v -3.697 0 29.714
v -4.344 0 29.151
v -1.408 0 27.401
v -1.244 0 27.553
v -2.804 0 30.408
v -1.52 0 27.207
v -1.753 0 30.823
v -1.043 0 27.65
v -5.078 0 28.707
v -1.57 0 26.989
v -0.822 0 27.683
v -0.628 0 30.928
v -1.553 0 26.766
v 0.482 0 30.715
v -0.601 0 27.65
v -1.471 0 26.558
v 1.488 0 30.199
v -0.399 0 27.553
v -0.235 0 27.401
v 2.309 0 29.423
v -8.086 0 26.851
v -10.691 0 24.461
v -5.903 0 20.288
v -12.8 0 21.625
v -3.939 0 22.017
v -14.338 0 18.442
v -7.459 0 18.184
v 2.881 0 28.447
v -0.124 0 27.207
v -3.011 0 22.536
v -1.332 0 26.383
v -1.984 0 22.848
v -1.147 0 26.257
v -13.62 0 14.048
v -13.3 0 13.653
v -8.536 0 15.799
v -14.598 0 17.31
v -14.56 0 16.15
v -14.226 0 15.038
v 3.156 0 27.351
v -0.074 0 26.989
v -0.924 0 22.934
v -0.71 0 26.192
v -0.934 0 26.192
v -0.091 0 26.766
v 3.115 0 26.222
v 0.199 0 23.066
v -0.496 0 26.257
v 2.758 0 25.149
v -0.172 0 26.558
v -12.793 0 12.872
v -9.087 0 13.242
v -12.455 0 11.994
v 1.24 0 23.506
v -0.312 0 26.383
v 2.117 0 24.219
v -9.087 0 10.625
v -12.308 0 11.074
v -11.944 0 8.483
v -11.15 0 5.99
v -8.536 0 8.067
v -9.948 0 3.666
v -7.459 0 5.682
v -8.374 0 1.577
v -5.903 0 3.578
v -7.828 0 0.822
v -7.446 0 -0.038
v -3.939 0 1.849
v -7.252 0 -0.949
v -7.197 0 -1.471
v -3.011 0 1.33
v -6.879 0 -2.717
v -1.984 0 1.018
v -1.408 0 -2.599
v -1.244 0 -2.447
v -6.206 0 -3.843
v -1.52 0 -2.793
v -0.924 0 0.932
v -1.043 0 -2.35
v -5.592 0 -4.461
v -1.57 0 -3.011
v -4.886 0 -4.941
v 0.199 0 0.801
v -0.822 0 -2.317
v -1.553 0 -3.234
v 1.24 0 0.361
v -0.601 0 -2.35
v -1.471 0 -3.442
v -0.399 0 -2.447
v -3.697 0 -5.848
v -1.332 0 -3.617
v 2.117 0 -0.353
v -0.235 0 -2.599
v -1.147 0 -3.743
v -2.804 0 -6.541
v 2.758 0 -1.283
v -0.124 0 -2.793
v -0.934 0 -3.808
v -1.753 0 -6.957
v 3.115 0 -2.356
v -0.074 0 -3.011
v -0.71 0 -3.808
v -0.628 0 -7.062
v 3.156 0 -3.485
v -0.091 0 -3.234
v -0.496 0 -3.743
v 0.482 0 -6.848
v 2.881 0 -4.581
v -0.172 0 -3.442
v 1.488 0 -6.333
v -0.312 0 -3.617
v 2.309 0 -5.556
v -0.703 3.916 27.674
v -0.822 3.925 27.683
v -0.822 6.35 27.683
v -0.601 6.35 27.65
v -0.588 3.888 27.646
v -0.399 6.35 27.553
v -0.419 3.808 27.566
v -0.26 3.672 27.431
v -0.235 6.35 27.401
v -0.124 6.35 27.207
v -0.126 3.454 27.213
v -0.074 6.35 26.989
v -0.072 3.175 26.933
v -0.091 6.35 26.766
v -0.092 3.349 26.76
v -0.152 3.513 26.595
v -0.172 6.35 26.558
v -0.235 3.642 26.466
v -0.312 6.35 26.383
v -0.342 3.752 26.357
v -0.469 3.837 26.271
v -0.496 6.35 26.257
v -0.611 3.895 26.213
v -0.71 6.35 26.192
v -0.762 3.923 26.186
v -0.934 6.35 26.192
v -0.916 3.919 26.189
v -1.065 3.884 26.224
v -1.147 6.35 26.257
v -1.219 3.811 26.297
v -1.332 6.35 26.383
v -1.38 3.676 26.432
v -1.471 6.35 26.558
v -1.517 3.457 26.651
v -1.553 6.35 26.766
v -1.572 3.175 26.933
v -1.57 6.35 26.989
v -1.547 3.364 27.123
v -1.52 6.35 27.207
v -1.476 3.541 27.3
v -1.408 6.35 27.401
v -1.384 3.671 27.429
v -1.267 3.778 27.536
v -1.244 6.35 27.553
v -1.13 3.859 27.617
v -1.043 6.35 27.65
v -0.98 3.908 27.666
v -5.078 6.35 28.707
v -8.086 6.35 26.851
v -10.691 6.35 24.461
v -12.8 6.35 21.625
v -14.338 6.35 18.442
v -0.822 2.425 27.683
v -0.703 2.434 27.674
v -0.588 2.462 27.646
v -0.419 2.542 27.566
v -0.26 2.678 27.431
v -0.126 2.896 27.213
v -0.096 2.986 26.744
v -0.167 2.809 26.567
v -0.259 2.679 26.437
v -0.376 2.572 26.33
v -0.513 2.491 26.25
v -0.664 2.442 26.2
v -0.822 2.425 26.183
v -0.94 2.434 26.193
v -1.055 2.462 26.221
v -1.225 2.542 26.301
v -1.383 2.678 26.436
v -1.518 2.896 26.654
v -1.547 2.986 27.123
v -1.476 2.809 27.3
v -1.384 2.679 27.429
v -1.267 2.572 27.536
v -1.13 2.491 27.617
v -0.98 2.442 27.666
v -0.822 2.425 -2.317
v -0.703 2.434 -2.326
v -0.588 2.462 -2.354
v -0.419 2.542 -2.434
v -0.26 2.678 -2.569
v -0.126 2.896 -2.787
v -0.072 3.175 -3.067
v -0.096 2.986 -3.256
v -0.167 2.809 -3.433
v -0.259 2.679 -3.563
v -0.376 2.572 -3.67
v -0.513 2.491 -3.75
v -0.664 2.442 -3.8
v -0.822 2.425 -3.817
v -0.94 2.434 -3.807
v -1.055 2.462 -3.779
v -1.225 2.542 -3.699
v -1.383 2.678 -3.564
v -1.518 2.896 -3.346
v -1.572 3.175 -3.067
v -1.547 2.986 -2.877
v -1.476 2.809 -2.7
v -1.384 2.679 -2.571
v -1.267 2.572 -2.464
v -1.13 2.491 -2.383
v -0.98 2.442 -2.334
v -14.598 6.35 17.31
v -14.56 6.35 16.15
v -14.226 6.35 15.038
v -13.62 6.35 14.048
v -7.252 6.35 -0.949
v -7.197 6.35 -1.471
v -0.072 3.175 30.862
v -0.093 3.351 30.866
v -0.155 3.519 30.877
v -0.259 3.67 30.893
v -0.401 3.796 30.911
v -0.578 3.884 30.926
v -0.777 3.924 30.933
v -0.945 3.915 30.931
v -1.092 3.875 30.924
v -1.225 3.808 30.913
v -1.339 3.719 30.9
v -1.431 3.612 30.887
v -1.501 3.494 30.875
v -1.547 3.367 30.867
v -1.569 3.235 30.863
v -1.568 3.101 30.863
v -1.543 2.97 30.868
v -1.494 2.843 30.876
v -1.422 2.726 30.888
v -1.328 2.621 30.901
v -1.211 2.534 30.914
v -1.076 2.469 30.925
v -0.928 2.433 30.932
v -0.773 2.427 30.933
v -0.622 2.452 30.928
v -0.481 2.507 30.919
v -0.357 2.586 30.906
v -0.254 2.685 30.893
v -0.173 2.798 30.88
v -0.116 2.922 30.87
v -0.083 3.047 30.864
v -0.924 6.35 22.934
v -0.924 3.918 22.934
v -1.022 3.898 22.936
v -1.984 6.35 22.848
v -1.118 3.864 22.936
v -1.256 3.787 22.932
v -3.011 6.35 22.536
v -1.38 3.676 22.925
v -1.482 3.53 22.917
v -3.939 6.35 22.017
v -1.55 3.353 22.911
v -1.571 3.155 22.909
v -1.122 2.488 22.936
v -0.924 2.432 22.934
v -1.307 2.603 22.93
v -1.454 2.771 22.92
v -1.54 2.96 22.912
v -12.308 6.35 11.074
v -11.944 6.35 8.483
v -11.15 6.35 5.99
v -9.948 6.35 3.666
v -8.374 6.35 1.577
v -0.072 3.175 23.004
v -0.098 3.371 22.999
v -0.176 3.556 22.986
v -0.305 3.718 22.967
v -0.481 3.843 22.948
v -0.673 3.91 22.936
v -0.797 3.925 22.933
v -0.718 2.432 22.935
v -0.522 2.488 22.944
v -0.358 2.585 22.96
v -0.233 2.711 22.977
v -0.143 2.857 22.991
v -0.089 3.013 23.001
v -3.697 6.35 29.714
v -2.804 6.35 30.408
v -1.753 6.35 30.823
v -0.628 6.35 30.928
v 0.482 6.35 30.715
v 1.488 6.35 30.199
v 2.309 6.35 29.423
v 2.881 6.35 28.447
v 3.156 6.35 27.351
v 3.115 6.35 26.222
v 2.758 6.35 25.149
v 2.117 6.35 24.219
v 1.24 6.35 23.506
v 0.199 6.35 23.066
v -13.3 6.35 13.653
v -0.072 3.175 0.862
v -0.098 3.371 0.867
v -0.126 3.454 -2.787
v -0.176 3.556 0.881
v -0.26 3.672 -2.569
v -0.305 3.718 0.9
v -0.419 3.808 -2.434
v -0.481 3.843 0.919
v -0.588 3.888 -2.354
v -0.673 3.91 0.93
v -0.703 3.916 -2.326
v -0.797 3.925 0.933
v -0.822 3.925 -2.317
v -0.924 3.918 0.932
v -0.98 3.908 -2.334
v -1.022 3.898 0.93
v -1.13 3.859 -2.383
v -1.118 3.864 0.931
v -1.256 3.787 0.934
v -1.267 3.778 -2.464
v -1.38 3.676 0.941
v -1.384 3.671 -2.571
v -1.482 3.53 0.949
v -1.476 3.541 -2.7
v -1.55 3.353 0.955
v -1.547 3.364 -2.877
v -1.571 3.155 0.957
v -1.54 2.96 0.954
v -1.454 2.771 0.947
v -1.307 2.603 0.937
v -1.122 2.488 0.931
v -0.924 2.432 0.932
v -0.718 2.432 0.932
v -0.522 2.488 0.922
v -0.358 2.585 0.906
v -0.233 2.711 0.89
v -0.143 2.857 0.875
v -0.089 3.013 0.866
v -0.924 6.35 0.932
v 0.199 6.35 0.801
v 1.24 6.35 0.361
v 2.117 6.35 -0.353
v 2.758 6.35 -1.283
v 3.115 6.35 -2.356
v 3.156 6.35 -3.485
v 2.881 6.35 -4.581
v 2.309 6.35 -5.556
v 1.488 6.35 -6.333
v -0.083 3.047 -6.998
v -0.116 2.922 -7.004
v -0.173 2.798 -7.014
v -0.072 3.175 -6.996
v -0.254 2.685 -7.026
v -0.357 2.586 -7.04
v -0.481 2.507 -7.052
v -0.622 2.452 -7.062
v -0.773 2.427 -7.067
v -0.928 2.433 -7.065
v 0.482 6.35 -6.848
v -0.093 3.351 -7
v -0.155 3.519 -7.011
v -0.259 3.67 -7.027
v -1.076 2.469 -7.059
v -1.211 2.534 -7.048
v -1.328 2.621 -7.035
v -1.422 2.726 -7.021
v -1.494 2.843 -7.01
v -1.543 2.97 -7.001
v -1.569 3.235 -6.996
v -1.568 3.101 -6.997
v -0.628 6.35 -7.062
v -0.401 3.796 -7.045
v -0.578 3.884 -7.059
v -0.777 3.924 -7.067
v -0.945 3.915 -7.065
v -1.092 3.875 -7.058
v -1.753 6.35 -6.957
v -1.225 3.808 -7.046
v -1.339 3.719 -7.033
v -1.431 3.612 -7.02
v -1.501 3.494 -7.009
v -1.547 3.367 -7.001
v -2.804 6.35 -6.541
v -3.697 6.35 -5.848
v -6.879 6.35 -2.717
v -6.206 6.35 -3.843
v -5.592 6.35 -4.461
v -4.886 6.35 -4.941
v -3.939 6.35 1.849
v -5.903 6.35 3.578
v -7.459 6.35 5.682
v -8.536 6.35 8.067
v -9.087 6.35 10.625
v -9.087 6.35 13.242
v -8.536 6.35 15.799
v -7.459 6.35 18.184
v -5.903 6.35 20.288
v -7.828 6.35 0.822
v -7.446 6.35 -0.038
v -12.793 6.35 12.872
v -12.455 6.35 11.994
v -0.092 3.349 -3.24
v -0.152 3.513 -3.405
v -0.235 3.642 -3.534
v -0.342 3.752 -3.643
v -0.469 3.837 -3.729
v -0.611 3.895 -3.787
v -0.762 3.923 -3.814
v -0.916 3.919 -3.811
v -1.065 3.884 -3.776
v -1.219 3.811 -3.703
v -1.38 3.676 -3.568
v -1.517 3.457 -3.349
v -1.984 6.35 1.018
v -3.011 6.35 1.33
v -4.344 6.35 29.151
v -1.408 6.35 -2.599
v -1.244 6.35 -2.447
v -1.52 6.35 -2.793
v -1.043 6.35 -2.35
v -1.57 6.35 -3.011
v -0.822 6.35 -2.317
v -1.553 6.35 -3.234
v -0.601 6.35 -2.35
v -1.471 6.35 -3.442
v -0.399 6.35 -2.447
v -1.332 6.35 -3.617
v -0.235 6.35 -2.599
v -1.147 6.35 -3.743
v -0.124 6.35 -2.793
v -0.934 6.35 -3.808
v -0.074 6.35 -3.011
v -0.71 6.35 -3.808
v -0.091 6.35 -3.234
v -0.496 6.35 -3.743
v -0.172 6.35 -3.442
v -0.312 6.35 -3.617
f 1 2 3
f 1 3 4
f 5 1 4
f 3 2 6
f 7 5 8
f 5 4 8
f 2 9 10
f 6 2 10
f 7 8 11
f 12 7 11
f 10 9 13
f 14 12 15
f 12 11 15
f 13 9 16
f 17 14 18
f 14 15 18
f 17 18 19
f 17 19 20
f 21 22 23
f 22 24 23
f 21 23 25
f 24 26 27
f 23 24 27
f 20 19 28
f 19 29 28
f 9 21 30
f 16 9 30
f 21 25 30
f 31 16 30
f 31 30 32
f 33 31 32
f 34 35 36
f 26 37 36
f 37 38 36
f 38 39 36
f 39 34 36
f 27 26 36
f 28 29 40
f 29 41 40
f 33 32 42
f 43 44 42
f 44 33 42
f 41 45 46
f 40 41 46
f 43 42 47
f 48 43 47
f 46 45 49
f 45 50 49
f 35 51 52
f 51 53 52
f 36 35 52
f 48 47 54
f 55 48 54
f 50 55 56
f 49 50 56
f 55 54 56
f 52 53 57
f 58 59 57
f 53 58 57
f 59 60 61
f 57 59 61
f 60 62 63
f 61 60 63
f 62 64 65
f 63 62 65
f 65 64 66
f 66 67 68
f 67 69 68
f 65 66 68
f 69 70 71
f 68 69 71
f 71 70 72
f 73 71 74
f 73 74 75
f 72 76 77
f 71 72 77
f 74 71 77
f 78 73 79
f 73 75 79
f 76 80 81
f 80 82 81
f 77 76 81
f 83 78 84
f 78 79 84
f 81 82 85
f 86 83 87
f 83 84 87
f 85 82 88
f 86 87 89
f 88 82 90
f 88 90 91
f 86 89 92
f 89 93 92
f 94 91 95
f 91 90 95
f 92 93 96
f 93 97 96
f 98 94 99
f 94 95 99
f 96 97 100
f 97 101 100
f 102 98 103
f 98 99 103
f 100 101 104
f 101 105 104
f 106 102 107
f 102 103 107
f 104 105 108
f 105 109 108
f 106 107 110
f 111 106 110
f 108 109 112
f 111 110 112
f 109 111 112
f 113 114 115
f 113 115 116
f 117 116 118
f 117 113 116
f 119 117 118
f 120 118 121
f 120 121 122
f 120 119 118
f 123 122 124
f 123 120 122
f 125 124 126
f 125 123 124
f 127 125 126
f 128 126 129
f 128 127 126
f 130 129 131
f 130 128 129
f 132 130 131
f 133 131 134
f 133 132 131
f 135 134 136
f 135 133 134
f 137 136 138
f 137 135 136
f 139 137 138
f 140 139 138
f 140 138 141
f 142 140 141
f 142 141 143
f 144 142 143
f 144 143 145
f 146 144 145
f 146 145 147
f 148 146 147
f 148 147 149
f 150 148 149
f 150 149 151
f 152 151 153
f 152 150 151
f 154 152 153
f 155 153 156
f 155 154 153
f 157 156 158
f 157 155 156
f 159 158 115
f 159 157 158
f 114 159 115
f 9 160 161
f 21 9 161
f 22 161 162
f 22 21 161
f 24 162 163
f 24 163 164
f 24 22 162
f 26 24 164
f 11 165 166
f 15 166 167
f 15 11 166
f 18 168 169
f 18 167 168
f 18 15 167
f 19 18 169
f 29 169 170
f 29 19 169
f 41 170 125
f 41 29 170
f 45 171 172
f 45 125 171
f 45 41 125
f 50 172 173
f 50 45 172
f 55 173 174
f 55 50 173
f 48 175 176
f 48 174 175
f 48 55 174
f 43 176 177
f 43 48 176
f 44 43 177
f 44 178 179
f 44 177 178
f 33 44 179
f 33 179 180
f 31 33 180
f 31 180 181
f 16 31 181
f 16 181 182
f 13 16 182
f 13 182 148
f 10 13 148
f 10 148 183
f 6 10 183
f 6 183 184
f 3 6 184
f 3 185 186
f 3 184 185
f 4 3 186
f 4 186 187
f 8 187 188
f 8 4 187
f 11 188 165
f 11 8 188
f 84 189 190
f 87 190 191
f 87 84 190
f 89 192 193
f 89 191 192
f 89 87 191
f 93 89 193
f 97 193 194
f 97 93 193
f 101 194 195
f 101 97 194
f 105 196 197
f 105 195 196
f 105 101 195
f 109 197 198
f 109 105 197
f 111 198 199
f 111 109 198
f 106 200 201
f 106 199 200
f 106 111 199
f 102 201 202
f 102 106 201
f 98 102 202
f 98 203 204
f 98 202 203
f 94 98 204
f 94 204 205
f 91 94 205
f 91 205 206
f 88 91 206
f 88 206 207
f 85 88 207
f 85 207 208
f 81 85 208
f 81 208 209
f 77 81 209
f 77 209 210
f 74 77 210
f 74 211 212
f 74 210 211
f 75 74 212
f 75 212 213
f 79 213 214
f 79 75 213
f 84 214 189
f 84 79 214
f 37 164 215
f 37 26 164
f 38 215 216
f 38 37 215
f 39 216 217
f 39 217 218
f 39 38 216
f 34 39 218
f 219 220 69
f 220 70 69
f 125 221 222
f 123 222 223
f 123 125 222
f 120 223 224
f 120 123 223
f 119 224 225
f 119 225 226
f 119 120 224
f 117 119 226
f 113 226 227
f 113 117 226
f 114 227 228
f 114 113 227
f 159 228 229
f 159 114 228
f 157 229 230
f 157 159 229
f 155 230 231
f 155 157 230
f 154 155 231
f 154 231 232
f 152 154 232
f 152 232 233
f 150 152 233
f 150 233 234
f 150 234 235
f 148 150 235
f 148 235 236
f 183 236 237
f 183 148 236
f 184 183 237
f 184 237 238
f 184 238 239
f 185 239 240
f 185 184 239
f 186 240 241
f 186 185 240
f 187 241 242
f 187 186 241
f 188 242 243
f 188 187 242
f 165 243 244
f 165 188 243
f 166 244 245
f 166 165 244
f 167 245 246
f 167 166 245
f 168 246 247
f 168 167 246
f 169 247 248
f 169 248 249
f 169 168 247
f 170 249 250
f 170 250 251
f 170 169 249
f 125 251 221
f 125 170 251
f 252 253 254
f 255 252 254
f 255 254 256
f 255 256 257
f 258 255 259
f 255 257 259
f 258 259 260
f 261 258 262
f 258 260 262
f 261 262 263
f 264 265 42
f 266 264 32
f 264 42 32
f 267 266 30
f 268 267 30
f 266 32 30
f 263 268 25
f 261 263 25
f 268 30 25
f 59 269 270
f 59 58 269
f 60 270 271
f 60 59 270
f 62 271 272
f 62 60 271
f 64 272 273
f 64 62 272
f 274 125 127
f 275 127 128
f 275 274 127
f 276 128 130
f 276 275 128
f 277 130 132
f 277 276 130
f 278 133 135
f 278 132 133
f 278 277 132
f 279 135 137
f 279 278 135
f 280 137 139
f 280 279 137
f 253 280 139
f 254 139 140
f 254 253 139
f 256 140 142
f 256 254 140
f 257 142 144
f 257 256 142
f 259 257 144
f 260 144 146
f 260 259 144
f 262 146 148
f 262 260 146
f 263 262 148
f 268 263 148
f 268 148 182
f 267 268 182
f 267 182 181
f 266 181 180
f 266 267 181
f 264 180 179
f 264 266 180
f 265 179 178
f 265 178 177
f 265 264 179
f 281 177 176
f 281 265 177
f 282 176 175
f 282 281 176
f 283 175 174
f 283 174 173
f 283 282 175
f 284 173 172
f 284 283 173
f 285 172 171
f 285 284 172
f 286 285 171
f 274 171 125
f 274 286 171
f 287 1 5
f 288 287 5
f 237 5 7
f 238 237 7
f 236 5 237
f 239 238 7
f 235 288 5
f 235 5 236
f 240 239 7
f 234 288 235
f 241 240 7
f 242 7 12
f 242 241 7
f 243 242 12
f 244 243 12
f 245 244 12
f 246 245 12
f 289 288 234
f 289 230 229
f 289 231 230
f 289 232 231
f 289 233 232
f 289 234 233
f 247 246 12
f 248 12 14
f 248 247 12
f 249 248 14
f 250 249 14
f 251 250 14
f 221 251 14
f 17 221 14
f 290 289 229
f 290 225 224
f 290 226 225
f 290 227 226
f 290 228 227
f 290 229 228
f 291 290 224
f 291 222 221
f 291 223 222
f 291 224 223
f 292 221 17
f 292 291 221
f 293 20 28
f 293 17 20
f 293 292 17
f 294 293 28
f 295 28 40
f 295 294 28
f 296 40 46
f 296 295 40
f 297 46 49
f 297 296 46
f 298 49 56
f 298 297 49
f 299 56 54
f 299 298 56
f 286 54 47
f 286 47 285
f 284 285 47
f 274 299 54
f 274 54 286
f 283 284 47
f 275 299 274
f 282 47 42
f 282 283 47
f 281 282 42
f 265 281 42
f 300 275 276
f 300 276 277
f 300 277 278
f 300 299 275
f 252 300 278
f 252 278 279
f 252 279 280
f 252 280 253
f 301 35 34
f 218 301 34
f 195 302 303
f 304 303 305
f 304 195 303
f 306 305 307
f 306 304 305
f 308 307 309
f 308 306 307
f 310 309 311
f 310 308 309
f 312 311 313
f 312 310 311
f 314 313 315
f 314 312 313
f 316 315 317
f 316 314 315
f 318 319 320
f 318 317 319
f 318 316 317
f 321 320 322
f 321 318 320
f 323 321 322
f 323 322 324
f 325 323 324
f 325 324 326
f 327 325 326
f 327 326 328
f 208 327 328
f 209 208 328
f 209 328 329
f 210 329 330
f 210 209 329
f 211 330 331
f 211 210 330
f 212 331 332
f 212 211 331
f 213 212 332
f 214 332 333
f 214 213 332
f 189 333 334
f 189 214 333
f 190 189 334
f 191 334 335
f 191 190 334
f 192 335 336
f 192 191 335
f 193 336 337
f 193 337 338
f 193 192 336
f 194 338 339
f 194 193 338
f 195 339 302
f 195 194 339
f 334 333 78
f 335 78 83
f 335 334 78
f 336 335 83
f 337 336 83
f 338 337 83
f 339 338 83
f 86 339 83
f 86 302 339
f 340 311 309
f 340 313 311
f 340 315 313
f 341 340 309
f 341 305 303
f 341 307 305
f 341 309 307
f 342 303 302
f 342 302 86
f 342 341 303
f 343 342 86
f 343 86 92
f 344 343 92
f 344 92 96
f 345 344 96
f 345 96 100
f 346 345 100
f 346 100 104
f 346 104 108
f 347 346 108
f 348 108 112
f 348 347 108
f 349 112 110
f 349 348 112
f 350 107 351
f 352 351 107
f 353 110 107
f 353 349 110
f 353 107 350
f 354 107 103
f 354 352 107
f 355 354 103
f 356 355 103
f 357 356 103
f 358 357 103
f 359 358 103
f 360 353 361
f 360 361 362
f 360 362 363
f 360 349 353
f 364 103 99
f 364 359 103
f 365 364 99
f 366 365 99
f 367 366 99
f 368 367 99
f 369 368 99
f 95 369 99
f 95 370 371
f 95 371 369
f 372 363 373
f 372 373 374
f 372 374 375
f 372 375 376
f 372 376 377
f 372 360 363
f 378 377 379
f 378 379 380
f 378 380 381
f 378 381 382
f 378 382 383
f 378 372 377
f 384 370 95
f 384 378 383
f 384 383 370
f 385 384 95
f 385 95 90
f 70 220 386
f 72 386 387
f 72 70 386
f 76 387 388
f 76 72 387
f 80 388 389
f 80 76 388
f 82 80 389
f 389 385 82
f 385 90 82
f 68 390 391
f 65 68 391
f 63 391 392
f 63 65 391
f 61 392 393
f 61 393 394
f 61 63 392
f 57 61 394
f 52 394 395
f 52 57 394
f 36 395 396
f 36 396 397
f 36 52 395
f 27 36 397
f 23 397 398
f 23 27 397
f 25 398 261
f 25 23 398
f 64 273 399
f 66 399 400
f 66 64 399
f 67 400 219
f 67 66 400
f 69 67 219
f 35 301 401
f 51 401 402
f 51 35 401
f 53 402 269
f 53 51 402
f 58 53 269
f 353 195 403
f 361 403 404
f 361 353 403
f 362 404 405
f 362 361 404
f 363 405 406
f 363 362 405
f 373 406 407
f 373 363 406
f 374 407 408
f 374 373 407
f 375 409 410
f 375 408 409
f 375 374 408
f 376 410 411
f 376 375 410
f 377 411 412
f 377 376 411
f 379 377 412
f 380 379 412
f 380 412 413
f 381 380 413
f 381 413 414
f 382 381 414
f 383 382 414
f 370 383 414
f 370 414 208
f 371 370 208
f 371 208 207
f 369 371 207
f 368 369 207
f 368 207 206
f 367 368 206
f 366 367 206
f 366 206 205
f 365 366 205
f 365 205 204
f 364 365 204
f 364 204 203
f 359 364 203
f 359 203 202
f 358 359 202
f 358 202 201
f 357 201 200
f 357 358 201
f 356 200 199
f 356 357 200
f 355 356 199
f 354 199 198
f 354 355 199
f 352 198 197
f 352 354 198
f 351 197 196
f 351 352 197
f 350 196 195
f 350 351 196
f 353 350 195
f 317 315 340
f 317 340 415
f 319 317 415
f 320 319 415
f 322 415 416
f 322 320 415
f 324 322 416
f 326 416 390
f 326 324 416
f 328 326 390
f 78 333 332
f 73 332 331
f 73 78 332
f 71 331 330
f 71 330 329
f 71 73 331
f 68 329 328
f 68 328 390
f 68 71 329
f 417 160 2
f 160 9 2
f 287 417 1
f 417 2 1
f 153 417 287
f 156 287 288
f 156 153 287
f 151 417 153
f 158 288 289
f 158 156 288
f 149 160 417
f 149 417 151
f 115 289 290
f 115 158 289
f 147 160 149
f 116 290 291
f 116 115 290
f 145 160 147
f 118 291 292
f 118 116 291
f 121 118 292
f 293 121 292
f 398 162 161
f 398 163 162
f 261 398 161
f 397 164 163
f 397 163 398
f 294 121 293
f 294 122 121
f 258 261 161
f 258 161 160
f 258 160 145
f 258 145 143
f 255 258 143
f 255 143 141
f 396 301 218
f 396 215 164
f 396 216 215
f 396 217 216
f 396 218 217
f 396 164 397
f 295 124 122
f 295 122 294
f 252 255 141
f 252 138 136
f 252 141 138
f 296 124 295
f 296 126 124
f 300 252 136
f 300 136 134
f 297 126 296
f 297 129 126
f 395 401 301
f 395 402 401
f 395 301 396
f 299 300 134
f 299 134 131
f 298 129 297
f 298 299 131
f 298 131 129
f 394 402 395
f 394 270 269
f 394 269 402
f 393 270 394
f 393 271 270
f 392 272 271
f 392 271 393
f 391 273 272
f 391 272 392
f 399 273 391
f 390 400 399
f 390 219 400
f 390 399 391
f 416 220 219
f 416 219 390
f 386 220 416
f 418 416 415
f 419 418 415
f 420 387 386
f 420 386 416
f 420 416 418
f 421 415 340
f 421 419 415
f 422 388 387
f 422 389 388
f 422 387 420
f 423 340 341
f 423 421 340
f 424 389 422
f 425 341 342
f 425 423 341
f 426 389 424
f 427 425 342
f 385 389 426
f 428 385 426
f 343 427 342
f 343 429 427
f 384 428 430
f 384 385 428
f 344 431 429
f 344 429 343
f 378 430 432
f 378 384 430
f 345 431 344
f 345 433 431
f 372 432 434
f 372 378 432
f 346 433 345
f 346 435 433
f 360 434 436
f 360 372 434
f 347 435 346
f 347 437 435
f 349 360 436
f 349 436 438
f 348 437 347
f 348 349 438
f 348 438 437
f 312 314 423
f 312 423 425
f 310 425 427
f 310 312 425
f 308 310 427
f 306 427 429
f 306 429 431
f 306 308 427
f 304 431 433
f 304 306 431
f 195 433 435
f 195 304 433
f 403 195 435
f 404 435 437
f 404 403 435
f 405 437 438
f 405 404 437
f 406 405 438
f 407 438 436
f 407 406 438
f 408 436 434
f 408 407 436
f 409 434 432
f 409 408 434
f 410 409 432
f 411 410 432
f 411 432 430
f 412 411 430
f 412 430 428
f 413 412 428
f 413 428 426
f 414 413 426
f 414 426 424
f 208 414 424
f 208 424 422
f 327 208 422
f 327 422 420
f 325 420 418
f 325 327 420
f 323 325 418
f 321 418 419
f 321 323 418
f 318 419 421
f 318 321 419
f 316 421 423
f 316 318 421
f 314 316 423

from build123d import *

# Parameters (mm, degrees)
SKETCH1_R               = 0.75
BOSS_EXTRUDE1_DEPTH     = 6.35
SKETCH2_R               = 4
SKETCH2_R_2             = 1.5
BOSS_EXTRUDE2_DEPTH     = 6.35
FILLET1_R               = 5
CUT_EXTRUDE1_DEPTH      = 36.18011987
CUT_EXTRUDE1_DEPTH_BACK = 36.18011987
FILLET2_R               = 4.5
CUT_EXTRUDE2_DEPTH      = 35.797952793
CUT_EXTRUDE2_DEPTH_BACK = 35.797952793
SKETCH5_R               = 0.75


with BuildPart() as part:
    # Sketch1 → Boss-Extrude1 (new body)
    with BuildSketch(Plane(origin=(0, 0, 0), x_dir=(1, 0, 0), z_dir=(0, 1, 0))):
        with BuildLine():
            ThreePointArc((0, 0), (-9.156655288, -11.933185502), (0, -23.866371003))
            ThreePointArc((0, -23.866371003), (2.24506403, -27.75493597), (-1.643500936, -30))
            ThreePointArc((-1.643500936, -30), (-15.506655288, -11.933185502), (-1.643500936, 6.133628997))
            ThreePointArc((-1.643500936, 6.133628997), (2.24506403, 3.888564967), (0, 0))
        make_face()
        with Locations(Location((-0.821750468, 3.066814498, 0), (0, 0, 270))):
            Circle(SKETCH1_R, mode=Mode.SUBTRACT)
        with Locations(Location((-0.821750468, -26.933185502, 0), (0, 0, 270))):
            Circle(SKETCH1_R, mode=Mode.SUBTRACT)
    extrude(amount=BOSS_EXTRUDE1_DEPTH)

    # Sketch2 → Boss-Extrude2 (add)
    # profile 1 of 2: a face of its own
    with BuildSketch(Plane(origin=(0, 6.35, 0), x_dir=(1, 0, 0), z_dir=(0, 1, 0))):
        with Locations((-0.821750468, 3.066814498)):
            Circle(SKETCH2_R)
        with Locations((-0.821750468, 3.066814498)):
            Circle(SKETCH2_R_2, mode=Mode.SUBTRACT)
    # profile 2 of 2: a face of its own
    with BuildSketch(Plane(origin=(0, 6.35, 0), x_dir=(1, 0, 0), z_dir=(0, 1, 0))):
        with Locations((-0.821750468, -26.933185502)):
            Circle(SKETCH2_R)
        with Locations((-0.821750468, -26.933185502)):
            Circle(SKETCH2_R_2, mode=Mode.SUBTRACT)
    extrude(amount=-BOSS_EXTRUDE2_DEPTH)

    # Fillet1
    fillet1_edges = [part.edges().sort_by_distance(p)[0] for p in [
        (-2.038682942, 3.175, 0.743575948),
        (-4.166745827, 3.175, -5.260215066),
        (-2.038682942, 3.175, 23.122795055),
        (-4.166745827, 3.175, 29.126586069),
    ]]
    fillet(fillet1_edges, radius=FILLET1_R)

    # Sketch4 → Cut-Extrude1 (cut, two sides: drawn at the far end of the back side and taken through both)
    with BuildSketch(Plane(origin=(0, 6.35, 0), x_dir=(1, 0, 0), z_dir=(0, 1, 0)).offset(-CUT_EXTRUDE1_DEPTH_BACK)):
        with BuildLine():
            Line((-7.783274695, -0.952423388), (-10.028338726, 1.292640642))
            ThreePointArc((-10.028338726, 1.292640642), (-14.082887201, -4.775419971), (-15.506655288, -11.933185502))
            Line((-15.506655288, -11.933185502), (-12.331655288, -11.933185502))
            ThreePointArc((-12.331655288, -11.933185502), (-11.149569685, -5.990439869), (-7.783274695, -0.952423388))
        make_face()
    extrude(amount=CUT_EXTRUDE1_DEPTH + CUT_EXTRUDE1_DEPTH_BACK, mode=Mode.SUBTRACT)

    # Chamfer1
    # the kernel refuses this chamfer: 3.25 mm, written as the material it takes off along each edge
    with BuildSketch(Plane(origin=(-15.506655288, -10.121546279, 11.933185502), x_dir=(0.9996220644729643, 0, -0.02749051143228412), z_dir=(0, 1, 0))) as chamfer1_piece_1_section:
        with BuildLine():
            Line((3.678679732, 0), (0.225552245, -4.042330768))
            Line((0.225552245, -4.042330768), (0.161654076, -4.054248153))
            ThreePointArc((0.161654076, -4.054248153), (-0.010664321, -2.031175025), (-0.064975434, 0.001786883))
            Line((-0.064975434, 0.001786883), (0.001786883, 0.064975434))
            ThreePointArc((0.001786883, 0.064975434), (1.839736708, 0.014430151), (3.680466615, 0.064975434))
            Line((3.680466615, 0.064975434), (3.678679732, 0))
        make_face()
    chamfer1_piece_1 = extrude(amount=26.593092558, mode=Mode.PRIVATE)
    chamfer1_piece_1 = chamfer1_piece_1 - Plane(origin=(3.197487418, 3.175, 11.933185502), x_dir=(-1, 0, 0), z_dir=(0, -1, 0)) * Cylinder(15.529142706, 70, mode=Mode.PRIVATE)
    add(chamfer1_piece_1, mode=Mode.SUBTRACT)
    with BuildSketch(Plane(origin=(-10.028338726, -10.121546279, -1.292640642), x_dir=(0.7634460432280789, 0, -0.6458716119163239), z_dir=(0, 1, 0))) as chamfer1_piece_2_section:
        with BuildLine():
            Line((4.048618512, 0), (0.204942617, -3.672966525))
            Line((0.204942617, -3.672966525), (0.140167642, -3.678370474))
            ThreePointArc((0.140167642, -3.678370474), (0.088085677, -1.837683405), (-0.064774975, -0.005403949))
            Line((-0.064774975, -0.005403949), (-0.005403949, 0.064774975))
            ThreePointArc((-0.005403949, 0.064774975), (2.027426371, 0.123806379), (4.056957562, 0.064462859))
            Line((4.056957562, 0.064462859), (4.048618512, 0))
        make_face()
    chamfer1_piece_2 = extrude(amount=26.593092558, mode=Mode.PRIVATE)
    chamfer1_piece_2 = chamfer1_piece_2 - Plane(origin=(3.197487418, 3.175, 11.933185502), x_dir=(-1, 0, 0), z_dir=(0, -1, 0)) * Cylinder(15.529142706, 70, mode=Mode.PRIVATE)
    add(chamfer1_piece_2, mode=Mode.SUBTRACT)

    # Fillet2
    fillet2_edges = [part.edges().sort_by_distance(p)[0] for p in [
        (-7.416497134, 3.175, 0.597507087),
        (-12.32326811, 3.175, 12.443500126),
        (-6.951183486, 3.175, -3.778257247),
        (-15.088374308, 3.175, 15.866659195),
    ]]
    fillet(fillet2_edges, radius=FILLET2_R)

    # Sketch5 → Cut-Extrude2 (cut, two sides: drawn at the far end of the back side and taken through both)
    with BuildSketch(Plane.XY.offset(-CUT_EXTRUDE2_DEPTH_BACK)):
        with Locations((-0.821750468, 3.175)):
            Circle(SKETCH5_R)
    extrude(amount=CUT_EXTRUDE2_DEPTH + CUT_EXTRUDE2_DEPTH_BACK, mode=Mode.SUBTRACT)


solid = part.part
